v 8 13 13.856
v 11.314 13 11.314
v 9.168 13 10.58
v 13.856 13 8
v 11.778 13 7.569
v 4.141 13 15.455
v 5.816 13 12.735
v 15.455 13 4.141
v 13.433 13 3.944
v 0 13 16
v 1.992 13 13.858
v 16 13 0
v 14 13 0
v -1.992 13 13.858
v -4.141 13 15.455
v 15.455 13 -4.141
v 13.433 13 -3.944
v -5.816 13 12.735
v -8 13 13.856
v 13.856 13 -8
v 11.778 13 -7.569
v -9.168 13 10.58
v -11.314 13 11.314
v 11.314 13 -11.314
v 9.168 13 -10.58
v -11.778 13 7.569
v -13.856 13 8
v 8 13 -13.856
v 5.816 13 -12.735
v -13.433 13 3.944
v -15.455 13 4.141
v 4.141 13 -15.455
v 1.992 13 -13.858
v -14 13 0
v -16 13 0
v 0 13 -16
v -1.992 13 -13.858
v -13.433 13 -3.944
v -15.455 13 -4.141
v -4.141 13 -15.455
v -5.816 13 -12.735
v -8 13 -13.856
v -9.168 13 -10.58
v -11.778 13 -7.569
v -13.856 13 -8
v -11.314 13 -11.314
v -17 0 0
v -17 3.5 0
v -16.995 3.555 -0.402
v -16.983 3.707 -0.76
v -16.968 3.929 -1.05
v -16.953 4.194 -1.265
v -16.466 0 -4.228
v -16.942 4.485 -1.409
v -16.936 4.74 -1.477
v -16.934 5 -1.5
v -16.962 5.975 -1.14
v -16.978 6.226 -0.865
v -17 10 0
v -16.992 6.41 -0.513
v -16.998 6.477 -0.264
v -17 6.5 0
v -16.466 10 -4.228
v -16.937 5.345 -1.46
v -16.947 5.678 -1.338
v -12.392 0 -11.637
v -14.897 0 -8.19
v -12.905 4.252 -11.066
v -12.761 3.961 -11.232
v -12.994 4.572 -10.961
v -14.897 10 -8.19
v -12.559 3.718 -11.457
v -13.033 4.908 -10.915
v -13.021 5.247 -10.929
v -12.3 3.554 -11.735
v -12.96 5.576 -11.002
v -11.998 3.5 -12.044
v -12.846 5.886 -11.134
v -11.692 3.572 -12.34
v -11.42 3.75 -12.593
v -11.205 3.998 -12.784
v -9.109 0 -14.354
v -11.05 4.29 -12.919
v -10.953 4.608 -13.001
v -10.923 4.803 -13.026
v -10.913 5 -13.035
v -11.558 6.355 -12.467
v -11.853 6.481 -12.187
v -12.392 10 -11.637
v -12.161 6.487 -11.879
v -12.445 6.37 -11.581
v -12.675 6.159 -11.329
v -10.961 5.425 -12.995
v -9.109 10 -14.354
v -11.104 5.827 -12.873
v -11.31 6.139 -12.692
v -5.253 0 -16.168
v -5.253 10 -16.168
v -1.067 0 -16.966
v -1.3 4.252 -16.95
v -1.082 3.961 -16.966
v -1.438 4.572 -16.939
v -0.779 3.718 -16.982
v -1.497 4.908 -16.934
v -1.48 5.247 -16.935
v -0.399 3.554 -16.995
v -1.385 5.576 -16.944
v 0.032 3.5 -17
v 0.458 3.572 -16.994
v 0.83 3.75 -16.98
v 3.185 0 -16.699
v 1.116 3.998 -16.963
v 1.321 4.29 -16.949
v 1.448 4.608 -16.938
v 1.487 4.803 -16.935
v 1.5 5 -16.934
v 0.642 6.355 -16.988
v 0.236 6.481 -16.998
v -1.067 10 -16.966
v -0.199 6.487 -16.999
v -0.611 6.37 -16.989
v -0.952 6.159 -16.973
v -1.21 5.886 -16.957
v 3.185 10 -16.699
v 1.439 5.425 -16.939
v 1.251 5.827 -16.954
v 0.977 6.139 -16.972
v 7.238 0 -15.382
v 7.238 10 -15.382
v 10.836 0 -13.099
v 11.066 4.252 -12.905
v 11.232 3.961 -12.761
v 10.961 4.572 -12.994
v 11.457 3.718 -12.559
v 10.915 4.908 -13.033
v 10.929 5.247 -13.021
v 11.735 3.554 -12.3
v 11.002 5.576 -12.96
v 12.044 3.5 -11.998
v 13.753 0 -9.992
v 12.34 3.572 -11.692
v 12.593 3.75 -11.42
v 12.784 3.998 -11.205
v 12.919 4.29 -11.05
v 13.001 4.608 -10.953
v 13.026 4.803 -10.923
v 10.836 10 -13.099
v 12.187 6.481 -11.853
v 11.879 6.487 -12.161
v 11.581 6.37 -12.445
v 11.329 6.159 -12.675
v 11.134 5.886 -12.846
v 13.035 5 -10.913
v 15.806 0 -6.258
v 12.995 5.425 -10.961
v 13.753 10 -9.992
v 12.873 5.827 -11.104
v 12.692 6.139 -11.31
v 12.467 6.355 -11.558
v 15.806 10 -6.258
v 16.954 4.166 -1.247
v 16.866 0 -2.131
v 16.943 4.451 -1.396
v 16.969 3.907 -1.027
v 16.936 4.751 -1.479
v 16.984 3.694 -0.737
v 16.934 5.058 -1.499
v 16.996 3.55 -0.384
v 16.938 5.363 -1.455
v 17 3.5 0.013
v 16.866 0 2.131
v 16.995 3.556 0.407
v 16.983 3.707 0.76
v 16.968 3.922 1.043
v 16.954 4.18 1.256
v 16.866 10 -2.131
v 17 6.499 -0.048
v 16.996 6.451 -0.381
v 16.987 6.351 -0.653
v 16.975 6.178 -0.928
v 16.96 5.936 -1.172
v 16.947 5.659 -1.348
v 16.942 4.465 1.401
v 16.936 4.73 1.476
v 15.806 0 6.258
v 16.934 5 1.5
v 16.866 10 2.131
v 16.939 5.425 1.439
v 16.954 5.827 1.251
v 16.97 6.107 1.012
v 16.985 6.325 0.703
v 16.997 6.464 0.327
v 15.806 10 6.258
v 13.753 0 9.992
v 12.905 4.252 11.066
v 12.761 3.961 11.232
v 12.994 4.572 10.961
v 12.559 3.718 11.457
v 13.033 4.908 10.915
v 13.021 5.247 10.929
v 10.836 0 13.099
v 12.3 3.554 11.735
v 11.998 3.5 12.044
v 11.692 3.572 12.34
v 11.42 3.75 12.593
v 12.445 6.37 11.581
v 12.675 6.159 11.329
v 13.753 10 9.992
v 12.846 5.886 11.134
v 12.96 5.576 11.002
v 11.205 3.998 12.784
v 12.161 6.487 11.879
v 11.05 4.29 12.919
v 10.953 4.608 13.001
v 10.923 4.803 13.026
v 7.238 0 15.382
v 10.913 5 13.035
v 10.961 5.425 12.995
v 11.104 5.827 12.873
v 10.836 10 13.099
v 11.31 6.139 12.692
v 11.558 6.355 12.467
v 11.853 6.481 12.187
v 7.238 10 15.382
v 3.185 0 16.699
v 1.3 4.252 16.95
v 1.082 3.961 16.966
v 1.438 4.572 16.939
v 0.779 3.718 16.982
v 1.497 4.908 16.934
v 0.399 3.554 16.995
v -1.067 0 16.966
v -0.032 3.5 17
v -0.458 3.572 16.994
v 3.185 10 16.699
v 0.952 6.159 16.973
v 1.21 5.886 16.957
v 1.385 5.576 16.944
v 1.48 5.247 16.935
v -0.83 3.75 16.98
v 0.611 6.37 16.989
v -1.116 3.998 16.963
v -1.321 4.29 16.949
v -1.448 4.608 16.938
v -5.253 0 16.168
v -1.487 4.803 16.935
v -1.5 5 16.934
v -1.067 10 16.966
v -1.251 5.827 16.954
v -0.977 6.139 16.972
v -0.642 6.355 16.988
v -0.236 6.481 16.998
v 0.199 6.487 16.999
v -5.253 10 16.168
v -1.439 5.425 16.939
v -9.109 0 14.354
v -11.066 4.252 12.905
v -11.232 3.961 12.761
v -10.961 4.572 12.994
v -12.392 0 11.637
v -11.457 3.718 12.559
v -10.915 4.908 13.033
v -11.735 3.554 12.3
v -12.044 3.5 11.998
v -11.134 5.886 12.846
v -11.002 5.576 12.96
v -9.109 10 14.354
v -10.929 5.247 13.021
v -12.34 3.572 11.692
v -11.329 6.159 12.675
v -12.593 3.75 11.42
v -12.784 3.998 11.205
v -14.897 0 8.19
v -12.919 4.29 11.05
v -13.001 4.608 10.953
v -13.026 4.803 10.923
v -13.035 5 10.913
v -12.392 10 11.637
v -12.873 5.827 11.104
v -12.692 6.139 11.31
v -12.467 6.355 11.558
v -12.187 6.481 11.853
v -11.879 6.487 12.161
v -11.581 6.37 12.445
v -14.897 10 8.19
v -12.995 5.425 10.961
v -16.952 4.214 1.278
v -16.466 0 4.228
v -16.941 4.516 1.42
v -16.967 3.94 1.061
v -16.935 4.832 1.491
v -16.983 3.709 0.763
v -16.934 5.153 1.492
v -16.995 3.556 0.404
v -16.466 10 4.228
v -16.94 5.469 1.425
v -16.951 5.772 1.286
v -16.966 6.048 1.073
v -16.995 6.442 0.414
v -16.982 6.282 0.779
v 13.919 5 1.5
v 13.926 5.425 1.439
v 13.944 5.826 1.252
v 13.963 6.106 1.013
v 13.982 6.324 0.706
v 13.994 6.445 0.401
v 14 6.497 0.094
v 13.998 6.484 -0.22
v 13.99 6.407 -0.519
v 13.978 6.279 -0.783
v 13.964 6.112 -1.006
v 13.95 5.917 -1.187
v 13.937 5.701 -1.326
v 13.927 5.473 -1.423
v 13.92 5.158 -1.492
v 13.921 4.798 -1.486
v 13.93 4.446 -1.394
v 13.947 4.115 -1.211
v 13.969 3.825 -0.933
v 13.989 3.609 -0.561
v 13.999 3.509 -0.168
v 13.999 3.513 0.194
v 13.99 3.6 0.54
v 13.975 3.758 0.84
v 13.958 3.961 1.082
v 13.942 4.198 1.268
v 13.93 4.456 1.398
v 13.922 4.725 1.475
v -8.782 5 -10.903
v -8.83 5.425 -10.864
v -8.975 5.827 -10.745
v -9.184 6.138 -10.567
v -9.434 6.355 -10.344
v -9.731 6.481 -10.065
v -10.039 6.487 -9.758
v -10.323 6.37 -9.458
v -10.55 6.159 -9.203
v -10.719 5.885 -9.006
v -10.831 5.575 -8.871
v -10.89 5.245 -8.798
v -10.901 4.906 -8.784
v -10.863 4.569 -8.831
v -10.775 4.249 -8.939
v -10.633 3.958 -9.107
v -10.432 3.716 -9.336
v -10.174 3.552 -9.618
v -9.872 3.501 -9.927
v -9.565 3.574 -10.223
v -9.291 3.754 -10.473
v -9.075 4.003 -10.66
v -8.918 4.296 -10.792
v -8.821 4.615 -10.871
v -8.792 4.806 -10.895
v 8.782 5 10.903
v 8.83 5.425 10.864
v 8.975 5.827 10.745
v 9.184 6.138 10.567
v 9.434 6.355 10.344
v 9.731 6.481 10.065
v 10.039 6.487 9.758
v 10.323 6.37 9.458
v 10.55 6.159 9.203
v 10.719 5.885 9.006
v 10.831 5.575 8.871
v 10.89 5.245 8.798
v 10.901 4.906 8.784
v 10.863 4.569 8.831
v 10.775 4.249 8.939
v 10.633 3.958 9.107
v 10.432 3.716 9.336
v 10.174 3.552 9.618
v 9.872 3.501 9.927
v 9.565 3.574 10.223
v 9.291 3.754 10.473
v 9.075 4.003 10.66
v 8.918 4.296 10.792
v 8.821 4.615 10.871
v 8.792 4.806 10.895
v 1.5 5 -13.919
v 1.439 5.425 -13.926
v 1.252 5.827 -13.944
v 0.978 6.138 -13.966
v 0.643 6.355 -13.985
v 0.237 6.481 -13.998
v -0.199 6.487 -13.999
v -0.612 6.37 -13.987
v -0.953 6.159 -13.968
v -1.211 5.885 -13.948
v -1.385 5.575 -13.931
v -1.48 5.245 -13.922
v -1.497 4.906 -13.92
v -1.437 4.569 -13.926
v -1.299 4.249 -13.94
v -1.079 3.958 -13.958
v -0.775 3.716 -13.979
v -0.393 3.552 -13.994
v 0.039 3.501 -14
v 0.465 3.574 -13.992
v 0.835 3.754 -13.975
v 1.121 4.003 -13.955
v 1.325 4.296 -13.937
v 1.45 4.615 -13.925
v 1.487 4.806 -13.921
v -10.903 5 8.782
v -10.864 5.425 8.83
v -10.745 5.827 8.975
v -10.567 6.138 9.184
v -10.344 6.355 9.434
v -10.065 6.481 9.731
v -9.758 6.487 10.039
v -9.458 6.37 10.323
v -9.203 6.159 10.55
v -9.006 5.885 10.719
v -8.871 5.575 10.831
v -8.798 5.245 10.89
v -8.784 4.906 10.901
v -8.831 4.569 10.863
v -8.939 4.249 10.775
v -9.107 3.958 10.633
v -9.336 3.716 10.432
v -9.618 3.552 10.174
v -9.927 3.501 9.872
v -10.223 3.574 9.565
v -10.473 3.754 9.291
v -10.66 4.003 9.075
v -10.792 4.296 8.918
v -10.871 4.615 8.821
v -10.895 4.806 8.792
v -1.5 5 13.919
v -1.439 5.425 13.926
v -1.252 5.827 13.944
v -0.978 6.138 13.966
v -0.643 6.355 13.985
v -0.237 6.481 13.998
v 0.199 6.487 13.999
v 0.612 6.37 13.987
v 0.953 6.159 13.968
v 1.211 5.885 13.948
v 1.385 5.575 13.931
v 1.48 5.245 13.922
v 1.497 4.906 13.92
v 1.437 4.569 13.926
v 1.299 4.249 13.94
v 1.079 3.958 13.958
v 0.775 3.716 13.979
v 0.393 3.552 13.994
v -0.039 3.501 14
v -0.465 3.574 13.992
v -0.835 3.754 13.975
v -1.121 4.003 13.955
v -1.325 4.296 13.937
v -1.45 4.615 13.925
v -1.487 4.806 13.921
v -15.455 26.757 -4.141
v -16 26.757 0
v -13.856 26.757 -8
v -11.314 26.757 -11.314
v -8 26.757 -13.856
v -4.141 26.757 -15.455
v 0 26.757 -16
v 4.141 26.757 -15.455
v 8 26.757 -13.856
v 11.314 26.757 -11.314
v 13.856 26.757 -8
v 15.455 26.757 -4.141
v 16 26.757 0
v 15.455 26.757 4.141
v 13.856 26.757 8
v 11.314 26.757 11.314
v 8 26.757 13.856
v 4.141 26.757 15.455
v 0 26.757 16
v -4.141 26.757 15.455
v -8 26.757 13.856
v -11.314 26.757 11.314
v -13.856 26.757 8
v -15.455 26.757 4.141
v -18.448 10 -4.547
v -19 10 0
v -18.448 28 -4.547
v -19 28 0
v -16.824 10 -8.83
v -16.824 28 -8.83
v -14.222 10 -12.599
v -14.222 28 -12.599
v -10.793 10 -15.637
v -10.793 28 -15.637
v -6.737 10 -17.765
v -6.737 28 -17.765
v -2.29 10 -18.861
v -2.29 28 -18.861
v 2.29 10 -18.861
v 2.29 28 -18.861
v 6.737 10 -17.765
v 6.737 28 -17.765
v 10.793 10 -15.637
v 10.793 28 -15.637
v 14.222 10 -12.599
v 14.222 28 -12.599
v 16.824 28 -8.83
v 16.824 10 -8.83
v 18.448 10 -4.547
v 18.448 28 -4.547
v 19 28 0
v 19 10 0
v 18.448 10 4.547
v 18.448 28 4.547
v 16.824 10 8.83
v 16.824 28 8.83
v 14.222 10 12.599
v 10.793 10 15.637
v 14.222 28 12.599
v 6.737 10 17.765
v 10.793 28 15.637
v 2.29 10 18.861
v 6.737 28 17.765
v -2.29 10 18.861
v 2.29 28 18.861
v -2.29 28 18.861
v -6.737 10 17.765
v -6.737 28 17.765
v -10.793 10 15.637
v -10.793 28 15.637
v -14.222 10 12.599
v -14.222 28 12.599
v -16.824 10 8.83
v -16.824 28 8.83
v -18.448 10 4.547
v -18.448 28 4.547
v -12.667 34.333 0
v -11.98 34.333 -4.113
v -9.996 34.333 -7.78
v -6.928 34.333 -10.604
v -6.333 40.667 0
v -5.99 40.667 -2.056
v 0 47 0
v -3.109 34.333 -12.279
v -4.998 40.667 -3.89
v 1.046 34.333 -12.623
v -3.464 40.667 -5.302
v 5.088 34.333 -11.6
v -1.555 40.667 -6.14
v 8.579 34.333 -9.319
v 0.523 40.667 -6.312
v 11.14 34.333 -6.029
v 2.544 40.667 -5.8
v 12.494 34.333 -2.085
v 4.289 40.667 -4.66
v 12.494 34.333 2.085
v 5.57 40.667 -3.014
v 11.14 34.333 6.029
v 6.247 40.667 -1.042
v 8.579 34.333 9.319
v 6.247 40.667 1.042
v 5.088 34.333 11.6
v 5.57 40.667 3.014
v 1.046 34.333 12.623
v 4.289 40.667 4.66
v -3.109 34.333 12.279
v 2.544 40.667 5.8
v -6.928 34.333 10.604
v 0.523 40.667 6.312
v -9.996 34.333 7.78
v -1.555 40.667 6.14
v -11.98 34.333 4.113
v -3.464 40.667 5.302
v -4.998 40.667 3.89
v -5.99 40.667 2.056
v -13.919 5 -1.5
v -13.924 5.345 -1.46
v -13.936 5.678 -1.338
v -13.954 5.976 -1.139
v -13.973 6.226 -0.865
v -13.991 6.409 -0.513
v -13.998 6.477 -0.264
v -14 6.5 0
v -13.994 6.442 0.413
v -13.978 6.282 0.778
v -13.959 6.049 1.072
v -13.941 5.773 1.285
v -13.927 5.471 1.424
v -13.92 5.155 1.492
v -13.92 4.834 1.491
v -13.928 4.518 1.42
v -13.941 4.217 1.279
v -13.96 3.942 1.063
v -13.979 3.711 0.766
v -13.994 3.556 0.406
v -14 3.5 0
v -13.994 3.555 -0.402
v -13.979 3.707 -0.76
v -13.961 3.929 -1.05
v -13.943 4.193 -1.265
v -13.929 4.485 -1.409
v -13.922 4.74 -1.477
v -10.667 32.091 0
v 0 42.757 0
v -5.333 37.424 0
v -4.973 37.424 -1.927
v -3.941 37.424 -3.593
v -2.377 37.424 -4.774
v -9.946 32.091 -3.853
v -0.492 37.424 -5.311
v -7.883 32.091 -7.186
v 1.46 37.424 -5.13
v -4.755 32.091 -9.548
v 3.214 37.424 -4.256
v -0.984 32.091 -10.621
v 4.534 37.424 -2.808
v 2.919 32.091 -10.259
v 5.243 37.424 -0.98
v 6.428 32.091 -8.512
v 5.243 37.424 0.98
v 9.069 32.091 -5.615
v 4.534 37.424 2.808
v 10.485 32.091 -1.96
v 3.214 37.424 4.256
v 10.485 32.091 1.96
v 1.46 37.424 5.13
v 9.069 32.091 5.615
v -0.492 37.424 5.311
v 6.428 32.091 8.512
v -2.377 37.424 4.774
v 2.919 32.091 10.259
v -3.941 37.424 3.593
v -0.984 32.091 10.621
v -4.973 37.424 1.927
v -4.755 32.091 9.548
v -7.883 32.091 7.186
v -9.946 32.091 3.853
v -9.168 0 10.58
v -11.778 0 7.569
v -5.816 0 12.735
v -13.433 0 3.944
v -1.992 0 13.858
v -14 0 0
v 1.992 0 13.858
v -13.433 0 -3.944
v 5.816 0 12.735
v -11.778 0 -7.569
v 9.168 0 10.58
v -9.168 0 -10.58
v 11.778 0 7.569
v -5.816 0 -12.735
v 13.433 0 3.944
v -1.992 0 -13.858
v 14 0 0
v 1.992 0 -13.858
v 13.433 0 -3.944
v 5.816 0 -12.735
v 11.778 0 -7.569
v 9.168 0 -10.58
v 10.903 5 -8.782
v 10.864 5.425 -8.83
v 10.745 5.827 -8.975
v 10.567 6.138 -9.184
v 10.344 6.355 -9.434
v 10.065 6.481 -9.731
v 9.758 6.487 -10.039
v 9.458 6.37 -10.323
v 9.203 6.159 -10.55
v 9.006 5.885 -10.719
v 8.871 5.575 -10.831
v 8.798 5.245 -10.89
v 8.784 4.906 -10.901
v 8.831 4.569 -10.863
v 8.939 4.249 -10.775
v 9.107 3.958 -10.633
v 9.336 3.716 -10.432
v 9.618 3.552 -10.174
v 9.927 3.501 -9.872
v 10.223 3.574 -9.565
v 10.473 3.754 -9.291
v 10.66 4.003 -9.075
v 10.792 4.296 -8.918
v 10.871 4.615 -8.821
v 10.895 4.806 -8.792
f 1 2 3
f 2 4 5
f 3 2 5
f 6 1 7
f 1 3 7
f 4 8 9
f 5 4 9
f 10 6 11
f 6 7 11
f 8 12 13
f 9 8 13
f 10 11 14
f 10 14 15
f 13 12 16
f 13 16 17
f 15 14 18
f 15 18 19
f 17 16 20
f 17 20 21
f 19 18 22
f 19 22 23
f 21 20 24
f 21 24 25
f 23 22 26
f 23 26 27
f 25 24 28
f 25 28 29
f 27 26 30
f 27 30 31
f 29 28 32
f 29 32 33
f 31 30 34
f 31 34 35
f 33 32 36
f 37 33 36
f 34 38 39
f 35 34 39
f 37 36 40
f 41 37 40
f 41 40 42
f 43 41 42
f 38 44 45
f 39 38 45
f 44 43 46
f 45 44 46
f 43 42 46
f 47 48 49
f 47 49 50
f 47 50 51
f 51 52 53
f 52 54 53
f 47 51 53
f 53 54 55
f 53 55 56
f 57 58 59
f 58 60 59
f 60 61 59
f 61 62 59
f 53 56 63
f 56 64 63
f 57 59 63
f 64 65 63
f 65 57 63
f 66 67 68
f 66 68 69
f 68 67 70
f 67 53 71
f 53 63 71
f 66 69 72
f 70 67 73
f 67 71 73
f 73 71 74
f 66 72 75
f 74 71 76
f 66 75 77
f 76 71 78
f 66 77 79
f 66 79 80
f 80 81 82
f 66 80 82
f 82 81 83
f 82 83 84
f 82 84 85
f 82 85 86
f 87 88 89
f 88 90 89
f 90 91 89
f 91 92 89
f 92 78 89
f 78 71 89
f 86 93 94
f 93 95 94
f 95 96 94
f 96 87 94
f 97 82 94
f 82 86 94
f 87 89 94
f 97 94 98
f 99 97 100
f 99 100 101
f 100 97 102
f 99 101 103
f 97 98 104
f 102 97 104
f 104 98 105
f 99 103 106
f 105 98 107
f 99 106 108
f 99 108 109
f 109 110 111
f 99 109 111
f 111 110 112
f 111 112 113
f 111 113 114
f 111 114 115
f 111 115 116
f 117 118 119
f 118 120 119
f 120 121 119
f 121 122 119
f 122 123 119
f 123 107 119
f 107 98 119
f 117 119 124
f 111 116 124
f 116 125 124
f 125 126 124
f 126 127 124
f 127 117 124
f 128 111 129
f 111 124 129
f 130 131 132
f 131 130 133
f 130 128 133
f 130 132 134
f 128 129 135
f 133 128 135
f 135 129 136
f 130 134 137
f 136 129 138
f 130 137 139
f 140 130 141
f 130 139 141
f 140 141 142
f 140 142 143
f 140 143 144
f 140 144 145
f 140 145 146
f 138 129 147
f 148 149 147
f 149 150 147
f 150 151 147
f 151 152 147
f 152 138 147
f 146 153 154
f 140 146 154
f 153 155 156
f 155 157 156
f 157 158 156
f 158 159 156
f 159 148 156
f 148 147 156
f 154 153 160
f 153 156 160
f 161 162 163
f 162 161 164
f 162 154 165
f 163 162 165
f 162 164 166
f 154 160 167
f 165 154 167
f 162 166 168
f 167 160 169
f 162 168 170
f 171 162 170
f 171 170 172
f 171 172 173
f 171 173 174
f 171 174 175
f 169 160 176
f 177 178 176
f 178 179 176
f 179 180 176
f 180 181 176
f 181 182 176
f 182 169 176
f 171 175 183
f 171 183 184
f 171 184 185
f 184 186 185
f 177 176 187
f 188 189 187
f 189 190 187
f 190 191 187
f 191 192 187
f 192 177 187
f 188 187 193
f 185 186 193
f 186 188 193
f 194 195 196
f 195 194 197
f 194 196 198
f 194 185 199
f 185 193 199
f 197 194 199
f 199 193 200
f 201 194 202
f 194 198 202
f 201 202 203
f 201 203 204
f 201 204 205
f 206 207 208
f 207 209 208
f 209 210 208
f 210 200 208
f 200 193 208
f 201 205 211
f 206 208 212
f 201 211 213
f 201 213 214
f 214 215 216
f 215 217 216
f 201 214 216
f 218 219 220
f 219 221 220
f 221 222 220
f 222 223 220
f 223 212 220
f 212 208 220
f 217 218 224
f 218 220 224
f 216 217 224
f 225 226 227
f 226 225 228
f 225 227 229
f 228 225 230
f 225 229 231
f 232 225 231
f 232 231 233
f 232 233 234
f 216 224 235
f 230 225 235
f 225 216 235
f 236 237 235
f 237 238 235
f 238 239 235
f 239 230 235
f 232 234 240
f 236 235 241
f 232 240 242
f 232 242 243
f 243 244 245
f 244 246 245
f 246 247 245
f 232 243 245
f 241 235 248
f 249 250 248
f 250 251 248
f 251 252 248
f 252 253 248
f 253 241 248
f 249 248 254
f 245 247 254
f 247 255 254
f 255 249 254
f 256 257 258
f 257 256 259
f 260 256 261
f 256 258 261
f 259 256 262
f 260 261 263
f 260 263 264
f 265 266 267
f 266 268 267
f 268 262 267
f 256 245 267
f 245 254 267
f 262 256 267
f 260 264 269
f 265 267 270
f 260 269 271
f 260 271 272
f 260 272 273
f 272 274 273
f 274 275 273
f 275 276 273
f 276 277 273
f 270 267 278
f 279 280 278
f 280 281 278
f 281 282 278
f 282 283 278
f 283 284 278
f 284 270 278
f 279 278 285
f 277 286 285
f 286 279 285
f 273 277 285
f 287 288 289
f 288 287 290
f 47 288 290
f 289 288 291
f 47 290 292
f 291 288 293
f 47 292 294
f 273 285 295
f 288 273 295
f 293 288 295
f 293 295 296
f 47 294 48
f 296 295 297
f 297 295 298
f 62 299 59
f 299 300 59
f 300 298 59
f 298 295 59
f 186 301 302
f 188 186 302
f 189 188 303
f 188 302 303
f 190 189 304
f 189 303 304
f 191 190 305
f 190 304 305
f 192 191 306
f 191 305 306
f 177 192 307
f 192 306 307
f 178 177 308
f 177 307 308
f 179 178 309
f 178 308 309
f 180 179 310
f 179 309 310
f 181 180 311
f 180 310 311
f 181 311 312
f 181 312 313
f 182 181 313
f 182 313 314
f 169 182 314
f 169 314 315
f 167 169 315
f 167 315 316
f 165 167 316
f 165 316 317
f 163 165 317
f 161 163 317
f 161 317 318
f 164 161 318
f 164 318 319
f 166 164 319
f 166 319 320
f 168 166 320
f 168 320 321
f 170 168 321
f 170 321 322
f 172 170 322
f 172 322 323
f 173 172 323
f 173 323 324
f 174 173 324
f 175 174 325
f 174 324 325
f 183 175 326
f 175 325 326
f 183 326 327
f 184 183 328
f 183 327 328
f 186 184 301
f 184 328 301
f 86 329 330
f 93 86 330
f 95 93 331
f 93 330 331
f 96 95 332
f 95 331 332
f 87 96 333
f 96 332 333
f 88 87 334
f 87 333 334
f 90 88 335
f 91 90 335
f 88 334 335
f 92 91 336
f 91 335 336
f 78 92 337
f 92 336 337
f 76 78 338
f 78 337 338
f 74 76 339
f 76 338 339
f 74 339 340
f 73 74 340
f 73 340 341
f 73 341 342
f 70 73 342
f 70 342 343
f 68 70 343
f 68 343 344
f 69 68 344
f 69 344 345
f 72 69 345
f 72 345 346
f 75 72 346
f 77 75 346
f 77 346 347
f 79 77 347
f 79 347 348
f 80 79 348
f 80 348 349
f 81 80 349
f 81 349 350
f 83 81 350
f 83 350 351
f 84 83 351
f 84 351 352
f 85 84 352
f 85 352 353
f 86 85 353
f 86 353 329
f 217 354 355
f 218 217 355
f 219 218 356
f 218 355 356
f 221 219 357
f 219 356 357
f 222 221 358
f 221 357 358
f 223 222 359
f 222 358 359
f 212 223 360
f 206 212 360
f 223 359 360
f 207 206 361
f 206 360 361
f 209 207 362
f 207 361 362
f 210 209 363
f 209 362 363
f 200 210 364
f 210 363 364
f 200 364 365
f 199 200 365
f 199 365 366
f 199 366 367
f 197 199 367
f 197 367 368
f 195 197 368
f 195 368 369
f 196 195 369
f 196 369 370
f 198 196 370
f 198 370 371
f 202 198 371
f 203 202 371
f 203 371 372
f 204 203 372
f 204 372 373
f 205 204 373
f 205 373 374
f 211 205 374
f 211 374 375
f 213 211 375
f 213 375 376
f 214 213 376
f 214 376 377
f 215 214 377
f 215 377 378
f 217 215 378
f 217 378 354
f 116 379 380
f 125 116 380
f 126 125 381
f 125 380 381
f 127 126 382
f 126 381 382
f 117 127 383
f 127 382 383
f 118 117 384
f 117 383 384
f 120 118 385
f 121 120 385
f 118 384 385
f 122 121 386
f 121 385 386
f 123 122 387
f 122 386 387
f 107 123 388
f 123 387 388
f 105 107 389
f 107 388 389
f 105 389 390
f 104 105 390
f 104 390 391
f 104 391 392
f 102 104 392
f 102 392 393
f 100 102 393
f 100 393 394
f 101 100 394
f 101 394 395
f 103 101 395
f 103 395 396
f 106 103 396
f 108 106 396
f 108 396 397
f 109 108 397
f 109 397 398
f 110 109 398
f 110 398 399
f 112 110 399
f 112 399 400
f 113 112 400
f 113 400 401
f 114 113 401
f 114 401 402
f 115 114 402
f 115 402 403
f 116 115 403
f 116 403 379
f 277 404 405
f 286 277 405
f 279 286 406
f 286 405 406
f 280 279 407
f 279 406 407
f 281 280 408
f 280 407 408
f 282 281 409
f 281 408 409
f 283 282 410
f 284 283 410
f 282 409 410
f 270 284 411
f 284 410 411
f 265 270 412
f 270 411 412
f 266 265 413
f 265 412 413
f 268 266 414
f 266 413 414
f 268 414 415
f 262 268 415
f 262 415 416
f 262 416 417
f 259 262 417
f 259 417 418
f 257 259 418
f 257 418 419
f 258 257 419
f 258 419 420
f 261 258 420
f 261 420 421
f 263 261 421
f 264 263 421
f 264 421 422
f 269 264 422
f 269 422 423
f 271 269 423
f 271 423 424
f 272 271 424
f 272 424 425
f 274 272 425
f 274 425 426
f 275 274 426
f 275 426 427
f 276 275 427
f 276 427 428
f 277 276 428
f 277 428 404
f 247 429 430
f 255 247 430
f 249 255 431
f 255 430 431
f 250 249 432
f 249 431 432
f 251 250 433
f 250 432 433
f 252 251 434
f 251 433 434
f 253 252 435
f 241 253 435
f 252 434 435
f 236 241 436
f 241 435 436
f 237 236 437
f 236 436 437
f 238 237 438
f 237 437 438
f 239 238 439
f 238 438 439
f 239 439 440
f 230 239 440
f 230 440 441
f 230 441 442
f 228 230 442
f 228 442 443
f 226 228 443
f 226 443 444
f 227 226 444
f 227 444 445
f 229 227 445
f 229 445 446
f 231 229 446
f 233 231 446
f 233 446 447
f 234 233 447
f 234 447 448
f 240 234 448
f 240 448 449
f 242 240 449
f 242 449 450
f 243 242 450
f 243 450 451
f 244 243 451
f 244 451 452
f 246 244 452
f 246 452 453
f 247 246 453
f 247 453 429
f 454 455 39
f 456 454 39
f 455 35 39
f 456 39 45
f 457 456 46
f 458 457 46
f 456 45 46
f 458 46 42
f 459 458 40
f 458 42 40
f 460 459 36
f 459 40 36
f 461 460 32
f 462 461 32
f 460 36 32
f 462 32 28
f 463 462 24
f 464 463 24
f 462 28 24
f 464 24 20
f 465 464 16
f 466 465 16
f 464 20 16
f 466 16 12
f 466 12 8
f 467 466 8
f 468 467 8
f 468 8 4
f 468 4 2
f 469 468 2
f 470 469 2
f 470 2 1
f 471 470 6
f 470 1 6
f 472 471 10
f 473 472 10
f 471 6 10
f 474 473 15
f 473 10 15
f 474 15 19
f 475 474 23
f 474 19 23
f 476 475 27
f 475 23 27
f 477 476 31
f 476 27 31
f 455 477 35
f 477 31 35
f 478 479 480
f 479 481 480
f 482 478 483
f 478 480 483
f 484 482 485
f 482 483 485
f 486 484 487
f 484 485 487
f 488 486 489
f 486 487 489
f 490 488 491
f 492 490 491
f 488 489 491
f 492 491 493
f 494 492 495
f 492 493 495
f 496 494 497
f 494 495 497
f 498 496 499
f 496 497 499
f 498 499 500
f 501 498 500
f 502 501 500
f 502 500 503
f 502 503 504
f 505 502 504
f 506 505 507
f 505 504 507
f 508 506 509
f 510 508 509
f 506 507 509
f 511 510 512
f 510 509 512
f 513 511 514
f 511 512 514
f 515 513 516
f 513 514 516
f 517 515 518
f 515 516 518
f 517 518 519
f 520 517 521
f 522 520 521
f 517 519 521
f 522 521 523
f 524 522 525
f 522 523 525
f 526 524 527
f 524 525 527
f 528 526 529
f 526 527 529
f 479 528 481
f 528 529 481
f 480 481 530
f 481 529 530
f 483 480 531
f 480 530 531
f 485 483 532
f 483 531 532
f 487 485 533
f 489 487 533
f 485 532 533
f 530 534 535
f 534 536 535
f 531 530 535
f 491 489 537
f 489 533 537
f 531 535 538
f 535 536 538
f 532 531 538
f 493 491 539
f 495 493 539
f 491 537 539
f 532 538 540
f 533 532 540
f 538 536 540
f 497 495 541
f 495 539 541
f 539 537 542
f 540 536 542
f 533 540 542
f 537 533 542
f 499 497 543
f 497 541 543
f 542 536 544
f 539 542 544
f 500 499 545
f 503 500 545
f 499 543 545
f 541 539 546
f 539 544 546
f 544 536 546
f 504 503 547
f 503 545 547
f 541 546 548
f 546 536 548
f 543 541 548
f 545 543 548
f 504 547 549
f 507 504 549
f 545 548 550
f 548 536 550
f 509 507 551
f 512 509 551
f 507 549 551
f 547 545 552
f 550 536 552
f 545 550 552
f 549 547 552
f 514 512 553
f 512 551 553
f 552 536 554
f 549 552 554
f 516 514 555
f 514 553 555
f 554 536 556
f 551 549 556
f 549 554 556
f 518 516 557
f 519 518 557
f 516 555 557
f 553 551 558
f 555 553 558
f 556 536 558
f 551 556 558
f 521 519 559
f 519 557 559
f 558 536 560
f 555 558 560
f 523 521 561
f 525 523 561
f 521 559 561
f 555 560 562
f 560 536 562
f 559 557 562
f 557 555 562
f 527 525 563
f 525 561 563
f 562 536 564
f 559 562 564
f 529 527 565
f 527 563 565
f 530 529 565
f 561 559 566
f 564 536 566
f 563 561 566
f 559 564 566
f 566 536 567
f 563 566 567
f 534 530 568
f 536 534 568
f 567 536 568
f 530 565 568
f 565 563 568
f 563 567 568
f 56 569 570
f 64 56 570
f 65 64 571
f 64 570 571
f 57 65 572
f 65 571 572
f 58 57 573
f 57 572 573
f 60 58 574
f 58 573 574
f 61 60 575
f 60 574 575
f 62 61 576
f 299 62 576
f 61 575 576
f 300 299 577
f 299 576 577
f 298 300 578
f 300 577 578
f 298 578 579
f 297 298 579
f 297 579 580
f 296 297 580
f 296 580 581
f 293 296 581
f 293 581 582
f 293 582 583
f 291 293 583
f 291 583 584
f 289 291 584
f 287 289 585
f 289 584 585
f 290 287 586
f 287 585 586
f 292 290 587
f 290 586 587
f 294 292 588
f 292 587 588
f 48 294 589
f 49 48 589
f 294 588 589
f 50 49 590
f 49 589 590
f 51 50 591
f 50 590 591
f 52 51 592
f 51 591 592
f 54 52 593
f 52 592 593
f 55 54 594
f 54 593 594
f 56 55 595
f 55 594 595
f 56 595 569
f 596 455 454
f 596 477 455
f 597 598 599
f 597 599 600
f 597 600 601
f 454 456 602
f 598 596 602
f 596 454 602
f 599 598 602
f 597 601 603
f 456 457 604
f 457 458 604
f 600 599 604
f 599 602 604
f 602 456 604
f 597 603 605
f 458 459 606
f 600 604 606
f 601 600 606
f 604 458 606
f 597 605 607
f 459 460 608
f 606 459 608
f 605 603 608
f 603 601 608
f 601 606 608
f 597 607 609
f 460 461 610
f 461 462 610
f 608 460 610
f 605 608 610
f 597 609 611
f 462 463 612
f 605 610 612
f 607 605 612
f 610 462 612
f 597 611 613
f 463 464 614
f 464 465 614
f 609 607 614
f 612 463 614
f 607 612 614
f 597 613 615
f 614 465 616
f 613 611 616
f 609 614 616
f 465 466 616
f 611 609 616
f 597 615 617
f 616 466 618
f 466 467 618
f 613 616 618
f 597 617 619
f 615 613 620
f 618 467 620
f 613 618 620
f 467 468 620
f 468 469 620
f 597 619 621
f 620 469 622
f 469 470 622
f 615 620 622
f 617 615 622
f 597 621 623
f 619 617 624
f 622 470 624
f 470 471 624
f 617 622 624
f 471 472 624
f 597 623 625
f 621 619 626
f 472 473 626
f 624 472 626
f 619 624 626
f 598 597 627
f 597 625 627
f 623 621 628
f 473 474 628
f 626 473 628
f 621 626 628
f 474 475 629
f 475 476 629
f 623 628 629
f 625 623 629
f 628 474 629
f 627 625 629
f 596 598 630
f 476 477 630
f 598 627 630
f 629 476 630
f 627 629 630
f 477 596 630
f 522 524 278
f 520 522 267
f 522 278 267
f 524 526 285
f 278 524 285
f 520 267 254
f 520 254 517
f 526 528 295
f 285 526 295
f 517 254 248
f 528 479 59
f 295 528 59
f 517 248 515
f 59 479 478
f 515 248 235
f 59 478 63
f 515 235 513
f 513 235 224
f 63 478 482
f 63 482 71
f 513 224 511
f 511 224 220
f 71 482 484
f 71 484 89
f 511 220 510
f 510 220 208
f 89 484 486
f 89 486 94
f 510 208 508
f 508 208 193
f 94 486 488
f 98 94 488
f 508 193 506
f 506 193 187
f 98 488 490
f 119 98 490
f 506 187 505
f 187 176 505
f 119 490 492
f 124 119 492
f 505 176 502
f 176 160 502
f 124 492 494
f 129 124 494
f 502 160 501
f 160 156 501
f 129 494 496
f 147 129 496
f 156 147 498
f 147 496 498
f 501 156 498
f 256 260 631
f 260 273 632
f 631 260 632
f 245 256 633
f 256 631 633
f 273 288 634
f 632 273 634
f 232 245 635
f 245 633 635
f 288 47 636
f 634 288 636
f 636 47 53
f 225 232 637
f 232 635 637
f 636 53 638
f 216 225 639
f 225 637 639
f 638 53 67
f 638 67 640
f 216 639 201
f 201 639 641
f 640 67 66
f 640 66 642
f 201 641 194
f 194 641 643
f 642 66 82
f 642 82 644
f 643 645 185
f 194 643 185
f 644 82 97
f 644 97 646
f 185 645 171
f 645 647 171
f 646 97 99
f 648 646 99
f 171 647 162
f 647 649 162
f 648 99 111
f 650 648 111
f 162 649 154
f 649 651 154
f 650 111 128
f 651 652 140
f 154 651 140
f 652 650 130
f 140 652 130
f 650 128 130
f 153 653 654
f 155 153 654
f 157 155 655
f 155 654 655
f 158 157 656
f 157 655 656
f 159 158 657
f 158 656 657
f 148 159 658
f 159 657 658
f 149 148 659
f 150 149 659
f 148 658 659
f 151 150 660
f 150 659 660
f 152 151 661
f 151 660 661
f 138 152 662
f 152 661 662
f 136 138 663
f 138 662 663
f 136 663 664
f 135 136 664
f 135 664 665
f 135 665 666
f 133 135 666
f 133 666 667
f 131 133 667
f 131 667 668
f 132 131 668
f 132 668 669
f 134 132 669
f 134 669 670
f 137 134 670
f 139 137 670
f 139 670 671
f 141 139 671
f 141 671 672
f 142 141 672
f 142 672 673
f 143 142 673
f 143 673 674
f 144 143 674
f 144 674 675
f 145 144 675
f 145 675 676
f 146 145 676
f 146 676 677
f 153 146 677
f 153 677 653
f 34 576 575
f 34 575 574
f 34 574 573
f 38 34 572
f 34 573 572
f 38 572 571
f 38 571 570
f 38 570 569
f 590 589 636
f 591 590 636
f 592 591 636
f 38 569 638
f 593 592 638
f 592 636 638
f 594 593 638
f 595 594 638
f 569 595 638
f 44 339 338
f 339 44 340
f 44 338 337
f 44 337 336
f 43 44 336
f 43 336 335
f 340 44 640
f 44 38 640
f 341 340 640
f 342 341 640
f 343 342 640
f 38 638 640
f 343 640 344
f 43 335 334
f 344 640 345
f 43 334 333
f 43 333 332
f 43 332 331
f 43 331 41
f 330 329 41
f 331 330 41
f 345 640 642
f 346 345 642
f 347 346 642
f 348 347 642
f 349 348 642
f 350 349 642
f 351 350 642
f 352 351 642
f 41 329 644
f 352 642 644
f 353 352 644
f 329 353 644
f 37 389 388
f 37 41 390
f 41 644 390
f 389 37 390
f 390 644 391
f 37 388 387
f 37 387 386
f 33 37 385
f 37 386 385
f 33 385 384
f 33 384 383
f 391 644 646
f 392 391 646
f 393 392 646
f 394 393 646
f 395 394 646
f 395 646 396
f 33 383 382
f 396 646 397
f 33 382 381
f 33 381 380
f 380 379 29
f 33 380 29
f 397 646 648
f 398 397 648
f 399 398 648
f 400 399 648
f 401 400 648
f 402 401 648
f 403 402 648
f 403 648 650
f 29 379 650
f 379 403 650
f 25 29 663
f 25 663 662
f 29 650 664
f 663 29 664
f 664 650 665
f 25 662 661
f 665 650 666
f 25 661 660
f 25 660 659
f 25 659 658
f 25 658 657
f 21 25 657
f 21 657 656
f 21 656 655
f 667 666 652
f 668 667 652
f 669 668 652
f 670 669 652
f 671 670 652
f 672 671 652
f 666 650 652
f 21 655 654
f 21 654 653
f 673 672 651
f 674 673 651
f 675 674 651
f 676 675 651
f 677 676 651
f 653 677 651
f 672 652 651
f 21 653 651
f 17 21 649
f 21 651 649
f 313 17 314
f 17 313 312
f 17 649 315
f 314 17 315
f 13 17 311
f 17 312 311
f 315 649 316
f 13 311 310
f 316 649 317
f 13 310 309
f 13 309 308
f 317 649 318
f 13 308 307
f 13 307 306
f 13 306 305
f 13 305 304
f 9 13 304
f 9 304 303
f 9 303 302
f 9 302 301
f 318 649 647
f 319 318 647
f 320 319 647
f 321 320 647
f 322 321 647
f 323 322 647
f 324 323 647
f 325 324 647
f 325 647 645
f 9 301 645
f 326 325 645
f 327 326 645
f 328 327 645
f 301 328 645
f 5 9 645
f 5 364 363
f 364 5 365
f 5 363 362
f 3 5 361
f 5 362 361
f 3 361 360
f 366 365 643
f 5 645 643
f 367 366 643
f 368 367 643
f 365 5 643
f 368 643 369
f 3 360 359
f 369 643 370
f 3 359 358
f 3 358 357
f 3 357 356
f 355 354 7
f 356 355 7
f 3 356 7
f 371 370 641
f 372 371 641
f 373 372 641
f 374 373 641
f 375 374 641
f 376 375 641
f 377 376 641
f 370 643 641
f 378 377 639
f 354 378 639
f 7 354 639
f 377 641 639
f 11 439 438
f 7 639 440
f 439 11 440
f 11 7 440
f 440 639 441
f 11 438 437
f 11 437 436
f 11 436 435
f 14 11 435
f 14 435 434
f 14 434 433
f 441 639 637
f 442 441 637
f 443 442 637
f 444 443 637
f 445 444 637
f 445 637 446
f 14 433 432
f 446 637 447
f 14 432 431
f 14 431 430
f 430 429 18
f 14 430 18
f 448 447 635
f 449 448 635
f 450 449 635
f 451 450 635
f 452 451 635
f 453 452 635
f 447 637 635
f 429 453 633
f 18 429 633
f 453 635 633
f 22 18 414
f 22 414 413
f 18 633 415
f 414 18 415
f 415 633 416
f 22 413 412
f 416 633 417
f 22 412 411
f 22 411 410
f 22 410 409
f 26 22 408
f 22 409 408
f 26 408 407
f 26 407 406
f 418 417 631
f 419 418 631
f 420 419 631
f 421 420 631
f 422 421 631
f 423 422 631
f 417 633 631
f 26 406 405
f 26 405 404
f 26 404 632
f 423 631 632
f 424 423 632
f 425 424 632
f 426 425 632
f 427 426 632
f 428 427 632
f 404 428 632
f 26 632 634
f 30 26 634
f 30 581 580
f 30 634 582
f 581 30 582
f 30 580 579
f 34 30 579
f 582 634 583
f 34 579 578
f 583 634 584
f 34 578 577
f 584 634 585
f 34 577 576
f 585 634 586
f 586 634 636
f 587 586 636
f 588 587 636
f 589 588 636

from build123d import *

# Parameters (mm, degrees)
SKETCH3_R          = 1.5
CUT_EXTRUDE1_DEPTH = 55.138710735
CIRPATTERN1_COUNT  = 8


with BuildPart() as part:
    # Sketch2 → Revolve1 (revolve)
    with BuildSketch(Plane.XY, mode=Mode.PRIVATE) as revolve1_sk:
        Polygon((17, 0), (17, 10), (19, 10), (19, 28), (0, 47), (0, 42.757359313), (16, 26.757359313), (16, 13), (14, 13), (14, 0), align=None)
    revolve(revolve1_sk.sketch.rotate(Axis((0, 26.112729166, 0), (0, -1, 0)), 180), axis=Axis((0, 26.112729166, 0), (0, -1, 0)))

    # Sketch3 → Cut-Extrude1 (cut, through all)
    with BuildSketch(Plane.XY):
        with Locations((0, 5)):
            Circle(SKETCH3_R)
    cut_extrude1 = extrude(amount=-CUT_EXTRUDE1_DEPTH, mode=Mode.SUBTRACT)

    # CirPattern1: Cut-Extrude1 ×8 about axis
    cirpattern1_axis = Axis((0, 26.112729166, 0), (0, 1, 0))
    for i in range(1, CIRPATTERN1_COUNT):
        add(cut_extrude1.rotate(cirpattern1_axis, i * 360 / CIRPATTERN1_COUNT), mode=Mode.SUBTRACT)


solid = part.part
